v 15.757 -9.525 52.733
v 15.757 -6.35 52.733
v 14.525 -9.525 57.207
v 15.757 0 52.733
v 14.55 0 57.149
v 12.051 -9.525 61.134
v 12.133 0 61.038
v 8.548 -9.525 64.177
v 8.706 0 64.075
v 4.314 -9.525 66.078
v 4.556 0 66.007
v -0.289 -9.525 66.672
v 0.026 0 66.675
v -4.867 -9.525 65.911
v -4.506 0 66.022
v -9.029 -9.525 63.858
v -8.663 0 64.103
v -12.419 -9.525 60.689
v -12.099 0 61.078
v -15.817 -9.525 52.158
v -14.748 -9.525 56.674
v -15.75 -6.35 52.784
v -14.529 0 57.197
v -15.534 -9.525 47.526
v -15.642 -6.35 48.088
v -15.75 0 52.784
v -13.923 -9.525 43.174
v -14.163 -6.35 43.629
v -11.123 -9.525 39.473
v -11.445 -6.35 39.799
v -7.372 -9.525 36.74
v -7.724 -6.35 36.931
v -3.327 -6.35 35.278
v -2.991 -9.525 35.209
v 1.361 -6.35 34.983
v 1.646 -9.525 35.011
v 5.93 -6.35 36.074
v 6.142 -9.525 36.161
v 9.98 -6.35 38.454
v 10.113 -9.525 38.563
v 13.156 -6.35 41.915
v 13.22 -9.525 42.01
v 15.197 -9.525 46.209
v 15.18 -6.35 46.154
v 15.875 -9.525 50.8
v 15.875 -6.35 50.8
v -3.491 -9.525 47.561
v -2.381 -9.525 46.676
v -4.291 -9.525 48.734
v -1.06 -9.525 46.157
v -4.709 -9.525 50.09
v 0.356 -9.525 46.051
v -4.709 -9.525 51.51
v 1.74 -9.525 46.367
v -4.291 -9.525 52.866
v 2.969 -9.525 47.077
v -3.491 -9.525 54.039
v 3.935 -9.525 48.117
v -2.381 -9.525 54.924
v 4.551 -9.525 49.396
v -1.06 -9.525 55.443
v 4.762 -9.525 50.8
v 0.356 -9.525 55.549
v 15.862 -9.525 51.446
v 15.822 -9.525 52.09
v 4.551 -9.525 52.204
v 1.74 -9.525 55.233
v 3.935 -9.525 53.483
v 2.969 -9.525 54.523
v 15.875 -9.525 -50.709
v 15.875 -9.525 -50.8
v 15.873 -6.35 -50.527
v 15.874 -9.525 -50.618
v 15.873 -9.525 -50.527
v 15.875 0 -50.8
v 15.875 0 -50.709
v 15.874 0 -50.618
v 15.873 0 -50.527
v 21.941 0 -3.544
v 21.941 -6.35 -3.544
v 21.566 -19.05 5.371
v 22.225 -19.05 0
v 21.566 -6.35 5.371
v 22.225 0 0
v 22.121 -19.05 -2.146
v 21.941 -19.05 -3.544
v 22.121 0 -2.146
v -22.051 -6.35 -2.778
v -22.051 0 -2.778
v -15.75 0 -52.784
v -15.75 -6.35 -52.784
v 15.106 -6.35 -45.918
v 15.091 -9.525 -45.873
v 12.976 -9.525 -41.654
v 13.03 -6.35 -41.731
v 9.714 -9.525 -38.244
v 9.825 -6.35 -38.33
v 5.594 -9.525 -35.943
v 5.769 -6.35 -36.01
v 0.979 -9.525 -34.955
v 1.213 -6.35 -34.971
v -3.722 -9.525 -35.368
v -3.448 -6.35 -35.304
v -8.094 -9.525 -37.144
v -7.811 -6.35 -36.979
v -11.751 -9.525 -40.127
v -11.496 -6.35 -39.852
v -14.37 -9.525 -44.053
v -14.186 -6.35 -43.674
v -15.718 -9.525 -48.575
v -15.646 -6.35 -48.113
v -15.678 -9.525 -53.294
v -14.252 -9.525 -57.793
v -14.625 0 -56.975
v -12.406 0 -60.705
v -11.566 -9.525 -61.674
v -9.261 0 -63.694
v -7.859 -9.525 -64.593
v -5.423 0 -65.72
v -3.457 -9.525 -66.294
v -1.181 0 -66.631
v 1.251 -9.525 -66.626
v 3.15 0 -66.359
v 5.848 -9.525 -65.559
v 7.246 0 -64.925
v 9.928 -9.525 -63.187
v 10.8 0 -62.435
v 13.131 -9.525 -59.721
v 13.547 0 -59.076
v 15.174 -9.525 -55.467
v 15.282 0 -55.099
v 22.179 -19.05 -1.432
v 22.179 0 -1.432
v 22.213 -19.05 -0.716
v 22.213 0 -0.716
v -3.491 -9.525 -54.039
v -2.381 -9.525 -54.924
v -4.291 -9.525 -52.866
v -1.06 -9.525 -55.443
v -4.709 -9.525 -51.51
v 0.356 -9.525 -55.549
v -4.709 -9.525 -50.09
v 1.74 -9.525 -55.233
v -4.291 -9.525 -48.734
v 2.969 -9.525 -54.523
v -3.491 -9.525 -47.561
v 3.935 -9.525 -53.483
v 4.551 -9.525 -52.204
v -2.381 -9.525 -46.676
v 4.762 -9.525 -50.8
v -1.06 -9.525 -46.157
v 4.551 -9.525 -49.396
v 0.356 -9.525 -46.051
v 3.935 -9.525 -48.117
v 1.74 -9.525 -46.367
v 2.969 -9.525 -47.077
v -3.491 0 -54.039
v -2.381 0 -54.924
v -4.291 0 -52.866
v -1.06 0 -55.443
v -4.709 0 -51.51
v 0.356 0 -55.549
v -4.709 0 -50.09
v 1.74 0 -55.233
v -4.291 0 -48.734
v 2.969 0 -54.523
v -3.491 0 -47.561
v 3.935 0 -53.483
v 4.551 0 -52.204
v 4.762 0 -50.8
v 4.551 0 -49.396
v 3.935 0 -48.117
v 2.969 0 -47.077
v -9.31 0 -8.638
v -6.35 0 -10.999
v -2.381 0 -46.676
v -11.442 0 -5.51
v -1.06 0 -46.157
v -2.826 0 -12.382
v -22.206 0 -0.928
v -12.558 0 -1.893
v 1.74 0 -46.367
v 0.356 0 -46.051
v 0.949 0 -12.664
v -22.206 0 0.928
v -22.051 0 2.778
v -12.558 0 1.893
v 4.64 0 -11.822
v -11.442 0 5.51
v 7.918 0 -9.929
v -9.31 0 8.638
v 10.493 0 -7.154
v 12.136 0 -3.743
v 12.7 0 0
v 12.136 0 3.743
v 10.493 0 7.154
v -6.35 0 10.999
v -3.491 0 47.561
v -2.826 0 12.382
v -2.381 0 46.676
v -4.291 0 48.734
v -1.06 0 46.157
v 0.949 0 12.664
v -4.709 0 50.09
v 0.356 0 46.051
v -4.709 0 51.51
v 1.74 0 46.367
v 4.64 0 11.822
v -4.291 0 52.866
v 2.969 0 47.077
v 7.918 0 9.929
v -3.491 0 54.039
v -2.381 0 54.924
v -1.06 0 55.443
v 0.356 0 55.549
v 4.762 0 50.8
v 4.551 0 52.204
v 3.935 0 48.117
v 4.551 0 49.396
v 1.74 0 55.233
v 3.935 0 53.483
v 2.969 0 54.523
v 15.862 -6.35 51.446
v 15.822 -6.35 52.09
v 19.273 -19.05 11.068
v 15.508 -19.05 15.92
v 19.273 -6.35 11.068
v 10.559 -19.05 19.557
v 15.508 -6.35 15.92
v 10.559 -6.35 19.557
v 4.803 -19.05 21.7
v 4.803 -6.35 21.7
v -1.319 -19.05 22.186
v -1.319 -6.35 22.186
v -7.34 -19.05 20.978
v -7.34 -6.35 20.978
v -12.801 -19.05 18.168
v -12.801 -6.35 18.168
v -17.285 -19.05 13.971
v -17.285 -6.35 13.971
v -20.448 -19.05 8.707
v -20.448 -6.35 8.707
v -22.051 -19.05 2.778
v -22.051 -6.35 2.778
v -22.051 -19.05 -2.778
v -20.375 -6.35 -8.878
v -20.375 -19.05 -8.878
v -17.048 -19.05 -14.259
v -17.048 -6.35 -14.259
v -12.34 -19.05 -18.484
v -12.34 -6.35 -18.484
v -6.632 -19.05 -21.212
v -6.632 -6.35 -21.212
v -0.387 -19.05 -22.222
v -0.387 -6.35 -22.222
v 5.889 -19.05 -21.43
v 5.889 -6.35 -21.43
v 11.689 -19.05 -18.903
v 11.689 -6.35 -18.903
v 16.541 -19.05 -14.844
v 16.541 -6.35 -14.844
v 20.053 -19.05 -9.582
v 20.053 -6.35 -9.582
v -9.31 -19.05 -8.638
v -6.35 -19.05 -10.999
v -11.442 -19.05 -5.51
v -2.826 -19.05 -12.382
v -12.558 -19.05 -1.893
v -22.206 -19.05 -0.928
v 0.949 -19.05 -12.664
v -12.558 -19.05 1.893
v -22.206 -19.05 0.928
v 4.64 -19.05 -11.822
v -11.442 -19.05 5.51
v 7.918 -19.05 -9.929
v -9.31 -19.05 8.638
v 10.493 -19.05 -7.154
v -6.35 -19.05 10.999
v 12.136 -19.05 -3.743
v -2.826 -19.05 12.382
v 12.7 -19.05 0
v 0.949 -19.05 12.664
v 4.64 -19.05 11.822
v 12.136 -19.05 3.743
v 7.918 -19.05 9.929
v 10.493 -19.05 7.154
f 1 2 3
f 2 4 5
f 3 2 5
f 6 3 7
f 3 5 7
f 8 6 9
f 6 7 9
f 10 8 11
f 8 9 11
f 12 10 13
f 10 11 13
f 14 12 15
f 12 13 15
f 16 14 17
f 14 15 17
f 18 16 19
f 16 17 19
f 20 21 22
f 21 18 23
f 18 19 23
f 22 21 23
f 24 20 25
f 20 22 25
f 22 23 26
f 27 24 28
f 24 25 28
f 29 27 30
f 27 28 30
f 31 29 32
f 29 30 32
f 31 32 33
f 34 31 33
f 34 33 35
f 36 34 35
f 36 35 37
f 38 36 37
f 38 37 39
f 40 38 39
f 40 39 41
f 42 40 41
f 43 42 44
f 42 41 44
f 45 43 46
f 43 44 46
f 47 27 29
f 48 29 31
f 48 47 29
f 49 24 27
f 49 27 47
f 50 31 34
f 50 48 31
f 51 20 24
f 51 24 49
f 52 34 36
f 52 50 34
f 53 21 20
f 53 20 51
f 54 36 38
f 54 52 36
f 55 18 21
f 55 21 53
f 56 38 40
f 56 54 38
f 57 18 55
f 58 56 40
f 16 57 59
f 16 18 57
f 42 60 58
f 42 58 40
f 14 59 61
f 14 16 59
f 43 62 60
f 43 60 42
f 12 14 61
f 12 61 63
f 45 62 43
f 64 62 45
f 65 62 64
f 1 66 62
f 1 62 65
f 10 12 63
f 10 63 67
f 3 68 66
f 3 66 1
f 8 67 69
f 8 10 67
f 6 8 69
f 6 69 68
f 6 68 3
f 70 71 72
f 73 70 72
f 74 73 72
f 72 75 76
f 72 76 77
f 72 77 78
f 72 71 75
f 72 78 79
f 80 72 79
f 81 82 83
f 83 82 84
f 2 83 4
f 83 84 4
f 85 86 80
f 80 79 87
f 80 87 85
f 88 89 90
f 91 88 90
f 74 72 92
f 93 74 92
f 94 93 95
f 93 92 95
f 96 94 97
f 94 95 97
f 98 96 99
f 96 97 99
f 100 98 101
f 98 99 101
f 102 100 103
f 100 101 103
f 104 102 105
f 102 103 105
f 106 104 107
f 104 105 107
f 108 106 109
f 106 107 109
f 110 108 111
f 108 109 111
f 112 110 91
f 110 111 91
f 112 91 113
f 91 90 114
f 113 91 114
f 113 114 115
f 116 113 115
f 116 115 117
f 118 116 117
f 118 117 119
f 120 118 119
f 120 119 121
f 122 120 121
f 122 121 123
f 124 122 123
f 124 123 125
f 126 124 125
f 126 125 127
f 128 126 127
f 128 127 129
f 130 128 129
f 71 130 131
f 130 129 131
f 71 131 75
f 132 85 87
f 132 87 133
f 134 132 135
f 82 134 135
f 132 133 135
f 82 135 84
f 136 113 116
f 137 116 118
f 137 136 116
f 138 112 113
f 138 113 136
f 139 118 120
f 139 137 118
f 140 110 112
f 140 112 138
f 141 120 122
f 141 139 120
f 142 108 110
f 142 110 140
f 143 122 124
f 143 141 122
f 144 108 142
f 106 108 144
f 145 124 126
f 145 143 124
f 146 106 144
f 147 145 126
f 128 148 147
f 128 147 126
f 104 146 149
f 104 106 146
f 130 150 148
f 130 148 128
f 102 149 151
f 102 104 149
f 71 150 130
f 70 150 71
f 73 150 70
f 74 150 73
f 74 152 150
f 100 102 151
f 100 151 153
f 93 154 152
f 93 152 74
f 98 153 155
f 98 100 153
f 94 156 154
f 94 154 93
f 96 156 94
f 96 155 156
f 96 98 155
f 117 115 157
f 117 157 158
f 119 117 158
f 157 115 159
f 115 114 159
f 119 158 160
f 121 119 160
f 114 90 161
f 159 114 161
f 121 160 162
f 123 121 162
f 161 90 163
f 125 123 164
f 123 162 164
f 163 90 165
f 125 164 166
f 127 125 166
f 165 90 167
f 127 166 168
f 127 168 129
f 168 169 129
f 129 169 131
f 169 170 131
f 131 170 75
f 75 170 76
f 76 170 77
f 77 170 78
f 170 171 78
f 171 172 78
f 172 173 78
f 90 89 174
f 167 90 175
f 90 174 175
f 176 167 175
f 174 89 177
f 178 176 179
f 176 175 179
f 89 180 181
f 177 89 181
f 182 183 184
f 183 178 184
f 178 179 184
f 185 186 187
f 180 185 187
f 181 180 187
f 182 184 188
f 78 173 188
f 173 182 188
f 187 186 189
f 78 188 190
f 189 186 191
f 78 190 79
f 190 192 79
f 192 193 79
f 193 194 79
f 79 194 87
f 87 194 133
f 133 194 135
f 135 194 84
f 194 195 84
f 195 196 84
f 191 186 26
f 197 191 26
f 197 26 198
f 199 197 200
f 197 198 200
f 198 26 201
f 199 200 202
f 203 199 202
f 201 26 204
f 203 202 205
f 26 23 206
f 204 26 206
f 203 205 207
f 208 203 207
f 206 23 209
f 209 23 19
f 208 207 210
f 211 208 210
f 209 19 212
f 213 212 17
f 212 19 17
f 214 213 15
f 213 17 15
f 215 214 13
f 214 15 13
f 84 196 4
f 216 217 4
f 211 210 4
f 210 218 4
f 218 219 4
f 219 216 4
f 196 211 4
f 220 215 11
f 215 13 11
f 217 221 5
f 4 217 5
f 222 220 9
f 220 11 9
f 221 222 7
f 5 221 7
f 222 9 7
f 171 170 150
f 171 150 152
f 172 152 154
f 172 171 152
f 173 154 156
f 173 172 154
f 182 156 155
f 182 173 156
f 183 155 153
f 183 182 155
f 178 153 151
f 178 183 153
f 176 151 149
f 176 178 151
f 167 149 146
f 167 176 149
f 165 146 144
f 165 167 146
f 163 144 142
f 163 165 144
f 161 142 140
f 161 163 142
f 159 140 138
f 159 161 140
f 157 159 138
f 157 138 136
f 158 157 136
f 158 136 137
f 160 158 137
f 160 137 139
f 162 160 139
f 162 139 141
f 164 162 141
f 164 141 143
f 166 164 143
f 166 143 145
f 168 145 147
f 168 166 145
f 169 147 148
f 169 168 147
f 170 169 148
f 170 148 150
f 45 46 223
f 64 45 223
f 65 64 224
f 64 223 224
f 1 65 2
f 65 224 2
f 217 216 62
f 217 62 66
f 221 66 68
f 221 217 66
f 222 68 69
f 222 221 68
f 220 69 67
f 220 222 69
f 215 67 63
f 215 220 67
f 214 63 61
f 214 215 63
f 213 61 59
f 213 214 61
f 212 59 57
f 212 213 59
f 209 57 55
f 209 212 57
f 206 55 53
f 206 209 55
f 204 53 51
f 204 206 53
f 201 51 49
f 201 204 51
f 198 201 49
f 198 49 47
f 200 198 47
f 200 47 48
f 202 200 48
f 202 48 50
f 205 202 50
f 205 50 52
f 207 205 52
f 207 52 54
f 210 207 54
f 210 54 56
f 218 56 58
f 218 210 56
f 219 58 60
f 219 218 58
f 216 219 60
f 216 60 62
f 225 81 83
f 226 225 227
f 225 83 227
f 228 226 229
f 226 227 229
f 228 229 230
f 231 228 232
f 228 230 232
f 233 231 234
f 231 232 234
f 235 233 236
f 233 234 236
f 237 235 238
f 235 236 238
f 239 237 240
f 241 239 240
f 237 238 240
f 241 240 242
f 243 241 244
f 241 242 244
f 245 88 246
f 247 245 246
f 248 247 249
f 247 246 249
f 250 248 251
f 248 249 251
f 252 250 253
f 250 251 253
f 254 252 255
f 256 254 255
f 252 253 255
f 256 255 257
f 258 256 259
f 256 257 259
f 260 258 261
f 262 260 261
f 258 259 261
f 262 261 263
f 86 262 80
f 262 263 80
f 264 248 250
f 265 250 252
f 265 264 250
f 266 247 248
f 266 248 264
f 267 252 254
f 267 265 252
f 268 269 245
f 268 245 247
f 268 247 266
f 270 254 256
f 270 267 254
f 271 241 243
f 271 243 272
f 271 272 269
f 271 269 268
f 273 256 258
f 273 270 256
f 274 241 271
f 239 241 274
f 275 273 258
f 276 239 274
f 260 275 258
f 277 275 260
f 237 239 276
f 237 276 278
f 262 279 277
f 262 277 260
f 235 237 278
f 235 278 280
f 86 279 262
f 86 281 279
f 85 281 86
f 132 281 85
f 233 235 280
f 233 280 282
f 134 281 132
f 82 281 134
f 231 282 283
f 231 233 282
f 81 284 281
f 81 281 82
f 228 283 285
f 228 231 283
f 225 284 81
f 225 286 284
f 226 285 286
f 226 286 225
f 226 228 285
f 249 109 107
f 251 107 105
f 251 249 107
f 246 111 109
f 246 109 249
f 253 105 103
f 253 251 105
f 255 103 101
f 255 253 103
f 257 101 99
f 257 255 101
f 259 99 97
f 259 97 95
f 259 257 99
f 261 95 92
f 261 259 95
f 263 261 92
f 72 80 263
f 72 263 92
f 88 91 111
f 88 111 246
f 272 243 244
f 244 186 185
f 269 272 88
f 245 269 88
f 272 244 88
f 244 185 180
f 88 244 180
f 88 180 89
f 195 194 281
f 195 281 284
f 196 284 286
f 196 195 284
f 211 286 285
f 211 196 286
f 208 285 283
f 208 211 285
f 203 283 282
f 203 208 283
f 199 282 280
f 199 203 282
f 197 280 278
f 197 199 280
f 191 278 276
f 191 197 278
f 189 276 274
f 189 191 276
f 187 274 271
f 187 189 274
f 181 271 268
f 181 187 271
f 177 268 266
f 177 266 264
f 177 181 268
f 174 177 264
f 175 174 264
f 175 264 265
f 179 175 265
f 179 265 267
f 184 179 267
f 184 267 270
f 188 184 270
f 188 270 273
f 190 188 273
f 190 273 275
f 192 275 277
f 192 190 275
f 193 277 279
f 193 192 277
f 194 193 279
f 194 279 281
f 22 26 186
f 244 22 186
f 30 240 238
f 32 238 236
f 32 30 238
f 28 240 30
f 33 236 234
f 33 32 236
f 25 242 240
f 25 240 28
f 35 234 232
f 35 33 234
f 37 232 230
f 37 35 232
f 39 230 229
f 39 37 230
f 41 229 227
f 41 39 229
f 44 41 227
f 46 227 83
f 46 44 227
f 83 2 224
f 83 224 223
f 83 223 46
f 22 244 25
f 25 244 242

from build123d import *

# Parameters (mm, degrees)
F0_R     = 12.7
F1_DEPTH = 19.05
F2_DEPTH = 6.35
F0_R_2   = 4.7625
F3_DEPTH = 9.525


with BuildPart() as f1:
    # F0 (on Front) → F1 (new body)
    with BuildSketch(Plane.XZ):
        with BuildLine():
            Line((21.9405616204, -3.5443449016), (22.1211236947, -2.1462785193))
            ThreePointArc((22.1211236947, -2.1462785193), (22.199015734, -1.0743953845), (22.225, 0))
            Line((22.225, 0), (21.5661626468, 5.3713363041))
            ThreePointArc((21.5661626468, 5.3713363041), (-1.3190436674, 22.1858231491), (-22.0506835685, 2.7781251166))
            ThreePointArc((-22.0506835685, 2.7781251166), (-22.225, 1.708e-07), (-22.0506836112, -2.7781247776))
            ThreePointArc((-22.0506836112, -2.7781247776), (-0.3870465512, -22.2216295525), (21.9405616204, -3.5443449016))
        make_face()
        Circle(F0_R, mode=Mode.SUBTRACT)
    extrude(amount=F1_DEPTH)

    # F0 (on Front) → F2 (join)
    with BuildSketch(Plane.XZ):
        with BuildLine():
            ThreePointArc((-22.0506835685, 2.7781251166), (-1.3190436674, 22.1858231491), (21.5661626468, 5.3713363041))
            Line((21.5661626468, 5.3713363041), (15.7569112616, 52.732711177))
            ThreePointArc((15.7569112616, 52.732711177), (15.8454503135, 51.7681577149), (15.875, 50.8))
            ThreePointArc((15.875, 50.8), (-0.9941387366, 34.9561585096), (-15.7504882737, 52.784375))
            Line((-15.7504882737, 52.784375), (-22.0506835685, 2.7781251166))
        make_face()
        with BuildLine():
            Line((15.8726570063, -50.5272646713), (21.9405616204, -3.5443449016))
            ThreePointArc((21.9405616204, -3.5443449016), (-0.3870465512, -22.2216295525), (-22.0506836112, -2.7781247776))
            Line((-22.0506836112, -2.7781247776), (-15.7504882737, -52.784375))
            ThreePointArc((-15.7504882737, -52.784375), (-1.1302070867, -34.9652831746), (15.8726570063, -50.5272646713))
        make_face()
    extrude(amount=F2_DEPTH)

    # F0 (on Front) → F3 (join)
    with BuildSketch(Plane.XZ):
        with BuildLine():
            ThreePointArc((15.875, 50.8), (15.8454503135, 51.7681577149), (15.7569112616, 52.732711177))
            ThreePointArc((15.7569112616, 52.732711177), (0.0260307769, 66.6749786582), (-15.7504882737, 52.784375))
            ThreePointArc((-15.7504882737, 52.784375), (-0.9941387366, 34.9561585096), (15.875, 50.8))
        make_face()
        with Locations((0, 50.8)):
            Circle(F0_R_2, mode=Mode.SUBTRACT)
        with BuildLine():
            ThreePointArc((15.875, -50.8), (15.8744142408, -50.6636273038), (15.8726570063, -50.5272646713))
            ThreePointArc((15.8726570063, -50.5272646713), (-1.1302070867, -34.9652831746), (-15.7504882737, -52.784375))
            ThreePointArc((-15.7504882737, -52.784375), (0.9941387366, -66.6438414904), (15.875, -50.8))
        make_face()
        with Locations((0, -50.8)):
            Circle(F0_R_2, mode=Mode.SUBTRACT)
    extrude(amount=F3_DEPTH)


solid = f1.part
